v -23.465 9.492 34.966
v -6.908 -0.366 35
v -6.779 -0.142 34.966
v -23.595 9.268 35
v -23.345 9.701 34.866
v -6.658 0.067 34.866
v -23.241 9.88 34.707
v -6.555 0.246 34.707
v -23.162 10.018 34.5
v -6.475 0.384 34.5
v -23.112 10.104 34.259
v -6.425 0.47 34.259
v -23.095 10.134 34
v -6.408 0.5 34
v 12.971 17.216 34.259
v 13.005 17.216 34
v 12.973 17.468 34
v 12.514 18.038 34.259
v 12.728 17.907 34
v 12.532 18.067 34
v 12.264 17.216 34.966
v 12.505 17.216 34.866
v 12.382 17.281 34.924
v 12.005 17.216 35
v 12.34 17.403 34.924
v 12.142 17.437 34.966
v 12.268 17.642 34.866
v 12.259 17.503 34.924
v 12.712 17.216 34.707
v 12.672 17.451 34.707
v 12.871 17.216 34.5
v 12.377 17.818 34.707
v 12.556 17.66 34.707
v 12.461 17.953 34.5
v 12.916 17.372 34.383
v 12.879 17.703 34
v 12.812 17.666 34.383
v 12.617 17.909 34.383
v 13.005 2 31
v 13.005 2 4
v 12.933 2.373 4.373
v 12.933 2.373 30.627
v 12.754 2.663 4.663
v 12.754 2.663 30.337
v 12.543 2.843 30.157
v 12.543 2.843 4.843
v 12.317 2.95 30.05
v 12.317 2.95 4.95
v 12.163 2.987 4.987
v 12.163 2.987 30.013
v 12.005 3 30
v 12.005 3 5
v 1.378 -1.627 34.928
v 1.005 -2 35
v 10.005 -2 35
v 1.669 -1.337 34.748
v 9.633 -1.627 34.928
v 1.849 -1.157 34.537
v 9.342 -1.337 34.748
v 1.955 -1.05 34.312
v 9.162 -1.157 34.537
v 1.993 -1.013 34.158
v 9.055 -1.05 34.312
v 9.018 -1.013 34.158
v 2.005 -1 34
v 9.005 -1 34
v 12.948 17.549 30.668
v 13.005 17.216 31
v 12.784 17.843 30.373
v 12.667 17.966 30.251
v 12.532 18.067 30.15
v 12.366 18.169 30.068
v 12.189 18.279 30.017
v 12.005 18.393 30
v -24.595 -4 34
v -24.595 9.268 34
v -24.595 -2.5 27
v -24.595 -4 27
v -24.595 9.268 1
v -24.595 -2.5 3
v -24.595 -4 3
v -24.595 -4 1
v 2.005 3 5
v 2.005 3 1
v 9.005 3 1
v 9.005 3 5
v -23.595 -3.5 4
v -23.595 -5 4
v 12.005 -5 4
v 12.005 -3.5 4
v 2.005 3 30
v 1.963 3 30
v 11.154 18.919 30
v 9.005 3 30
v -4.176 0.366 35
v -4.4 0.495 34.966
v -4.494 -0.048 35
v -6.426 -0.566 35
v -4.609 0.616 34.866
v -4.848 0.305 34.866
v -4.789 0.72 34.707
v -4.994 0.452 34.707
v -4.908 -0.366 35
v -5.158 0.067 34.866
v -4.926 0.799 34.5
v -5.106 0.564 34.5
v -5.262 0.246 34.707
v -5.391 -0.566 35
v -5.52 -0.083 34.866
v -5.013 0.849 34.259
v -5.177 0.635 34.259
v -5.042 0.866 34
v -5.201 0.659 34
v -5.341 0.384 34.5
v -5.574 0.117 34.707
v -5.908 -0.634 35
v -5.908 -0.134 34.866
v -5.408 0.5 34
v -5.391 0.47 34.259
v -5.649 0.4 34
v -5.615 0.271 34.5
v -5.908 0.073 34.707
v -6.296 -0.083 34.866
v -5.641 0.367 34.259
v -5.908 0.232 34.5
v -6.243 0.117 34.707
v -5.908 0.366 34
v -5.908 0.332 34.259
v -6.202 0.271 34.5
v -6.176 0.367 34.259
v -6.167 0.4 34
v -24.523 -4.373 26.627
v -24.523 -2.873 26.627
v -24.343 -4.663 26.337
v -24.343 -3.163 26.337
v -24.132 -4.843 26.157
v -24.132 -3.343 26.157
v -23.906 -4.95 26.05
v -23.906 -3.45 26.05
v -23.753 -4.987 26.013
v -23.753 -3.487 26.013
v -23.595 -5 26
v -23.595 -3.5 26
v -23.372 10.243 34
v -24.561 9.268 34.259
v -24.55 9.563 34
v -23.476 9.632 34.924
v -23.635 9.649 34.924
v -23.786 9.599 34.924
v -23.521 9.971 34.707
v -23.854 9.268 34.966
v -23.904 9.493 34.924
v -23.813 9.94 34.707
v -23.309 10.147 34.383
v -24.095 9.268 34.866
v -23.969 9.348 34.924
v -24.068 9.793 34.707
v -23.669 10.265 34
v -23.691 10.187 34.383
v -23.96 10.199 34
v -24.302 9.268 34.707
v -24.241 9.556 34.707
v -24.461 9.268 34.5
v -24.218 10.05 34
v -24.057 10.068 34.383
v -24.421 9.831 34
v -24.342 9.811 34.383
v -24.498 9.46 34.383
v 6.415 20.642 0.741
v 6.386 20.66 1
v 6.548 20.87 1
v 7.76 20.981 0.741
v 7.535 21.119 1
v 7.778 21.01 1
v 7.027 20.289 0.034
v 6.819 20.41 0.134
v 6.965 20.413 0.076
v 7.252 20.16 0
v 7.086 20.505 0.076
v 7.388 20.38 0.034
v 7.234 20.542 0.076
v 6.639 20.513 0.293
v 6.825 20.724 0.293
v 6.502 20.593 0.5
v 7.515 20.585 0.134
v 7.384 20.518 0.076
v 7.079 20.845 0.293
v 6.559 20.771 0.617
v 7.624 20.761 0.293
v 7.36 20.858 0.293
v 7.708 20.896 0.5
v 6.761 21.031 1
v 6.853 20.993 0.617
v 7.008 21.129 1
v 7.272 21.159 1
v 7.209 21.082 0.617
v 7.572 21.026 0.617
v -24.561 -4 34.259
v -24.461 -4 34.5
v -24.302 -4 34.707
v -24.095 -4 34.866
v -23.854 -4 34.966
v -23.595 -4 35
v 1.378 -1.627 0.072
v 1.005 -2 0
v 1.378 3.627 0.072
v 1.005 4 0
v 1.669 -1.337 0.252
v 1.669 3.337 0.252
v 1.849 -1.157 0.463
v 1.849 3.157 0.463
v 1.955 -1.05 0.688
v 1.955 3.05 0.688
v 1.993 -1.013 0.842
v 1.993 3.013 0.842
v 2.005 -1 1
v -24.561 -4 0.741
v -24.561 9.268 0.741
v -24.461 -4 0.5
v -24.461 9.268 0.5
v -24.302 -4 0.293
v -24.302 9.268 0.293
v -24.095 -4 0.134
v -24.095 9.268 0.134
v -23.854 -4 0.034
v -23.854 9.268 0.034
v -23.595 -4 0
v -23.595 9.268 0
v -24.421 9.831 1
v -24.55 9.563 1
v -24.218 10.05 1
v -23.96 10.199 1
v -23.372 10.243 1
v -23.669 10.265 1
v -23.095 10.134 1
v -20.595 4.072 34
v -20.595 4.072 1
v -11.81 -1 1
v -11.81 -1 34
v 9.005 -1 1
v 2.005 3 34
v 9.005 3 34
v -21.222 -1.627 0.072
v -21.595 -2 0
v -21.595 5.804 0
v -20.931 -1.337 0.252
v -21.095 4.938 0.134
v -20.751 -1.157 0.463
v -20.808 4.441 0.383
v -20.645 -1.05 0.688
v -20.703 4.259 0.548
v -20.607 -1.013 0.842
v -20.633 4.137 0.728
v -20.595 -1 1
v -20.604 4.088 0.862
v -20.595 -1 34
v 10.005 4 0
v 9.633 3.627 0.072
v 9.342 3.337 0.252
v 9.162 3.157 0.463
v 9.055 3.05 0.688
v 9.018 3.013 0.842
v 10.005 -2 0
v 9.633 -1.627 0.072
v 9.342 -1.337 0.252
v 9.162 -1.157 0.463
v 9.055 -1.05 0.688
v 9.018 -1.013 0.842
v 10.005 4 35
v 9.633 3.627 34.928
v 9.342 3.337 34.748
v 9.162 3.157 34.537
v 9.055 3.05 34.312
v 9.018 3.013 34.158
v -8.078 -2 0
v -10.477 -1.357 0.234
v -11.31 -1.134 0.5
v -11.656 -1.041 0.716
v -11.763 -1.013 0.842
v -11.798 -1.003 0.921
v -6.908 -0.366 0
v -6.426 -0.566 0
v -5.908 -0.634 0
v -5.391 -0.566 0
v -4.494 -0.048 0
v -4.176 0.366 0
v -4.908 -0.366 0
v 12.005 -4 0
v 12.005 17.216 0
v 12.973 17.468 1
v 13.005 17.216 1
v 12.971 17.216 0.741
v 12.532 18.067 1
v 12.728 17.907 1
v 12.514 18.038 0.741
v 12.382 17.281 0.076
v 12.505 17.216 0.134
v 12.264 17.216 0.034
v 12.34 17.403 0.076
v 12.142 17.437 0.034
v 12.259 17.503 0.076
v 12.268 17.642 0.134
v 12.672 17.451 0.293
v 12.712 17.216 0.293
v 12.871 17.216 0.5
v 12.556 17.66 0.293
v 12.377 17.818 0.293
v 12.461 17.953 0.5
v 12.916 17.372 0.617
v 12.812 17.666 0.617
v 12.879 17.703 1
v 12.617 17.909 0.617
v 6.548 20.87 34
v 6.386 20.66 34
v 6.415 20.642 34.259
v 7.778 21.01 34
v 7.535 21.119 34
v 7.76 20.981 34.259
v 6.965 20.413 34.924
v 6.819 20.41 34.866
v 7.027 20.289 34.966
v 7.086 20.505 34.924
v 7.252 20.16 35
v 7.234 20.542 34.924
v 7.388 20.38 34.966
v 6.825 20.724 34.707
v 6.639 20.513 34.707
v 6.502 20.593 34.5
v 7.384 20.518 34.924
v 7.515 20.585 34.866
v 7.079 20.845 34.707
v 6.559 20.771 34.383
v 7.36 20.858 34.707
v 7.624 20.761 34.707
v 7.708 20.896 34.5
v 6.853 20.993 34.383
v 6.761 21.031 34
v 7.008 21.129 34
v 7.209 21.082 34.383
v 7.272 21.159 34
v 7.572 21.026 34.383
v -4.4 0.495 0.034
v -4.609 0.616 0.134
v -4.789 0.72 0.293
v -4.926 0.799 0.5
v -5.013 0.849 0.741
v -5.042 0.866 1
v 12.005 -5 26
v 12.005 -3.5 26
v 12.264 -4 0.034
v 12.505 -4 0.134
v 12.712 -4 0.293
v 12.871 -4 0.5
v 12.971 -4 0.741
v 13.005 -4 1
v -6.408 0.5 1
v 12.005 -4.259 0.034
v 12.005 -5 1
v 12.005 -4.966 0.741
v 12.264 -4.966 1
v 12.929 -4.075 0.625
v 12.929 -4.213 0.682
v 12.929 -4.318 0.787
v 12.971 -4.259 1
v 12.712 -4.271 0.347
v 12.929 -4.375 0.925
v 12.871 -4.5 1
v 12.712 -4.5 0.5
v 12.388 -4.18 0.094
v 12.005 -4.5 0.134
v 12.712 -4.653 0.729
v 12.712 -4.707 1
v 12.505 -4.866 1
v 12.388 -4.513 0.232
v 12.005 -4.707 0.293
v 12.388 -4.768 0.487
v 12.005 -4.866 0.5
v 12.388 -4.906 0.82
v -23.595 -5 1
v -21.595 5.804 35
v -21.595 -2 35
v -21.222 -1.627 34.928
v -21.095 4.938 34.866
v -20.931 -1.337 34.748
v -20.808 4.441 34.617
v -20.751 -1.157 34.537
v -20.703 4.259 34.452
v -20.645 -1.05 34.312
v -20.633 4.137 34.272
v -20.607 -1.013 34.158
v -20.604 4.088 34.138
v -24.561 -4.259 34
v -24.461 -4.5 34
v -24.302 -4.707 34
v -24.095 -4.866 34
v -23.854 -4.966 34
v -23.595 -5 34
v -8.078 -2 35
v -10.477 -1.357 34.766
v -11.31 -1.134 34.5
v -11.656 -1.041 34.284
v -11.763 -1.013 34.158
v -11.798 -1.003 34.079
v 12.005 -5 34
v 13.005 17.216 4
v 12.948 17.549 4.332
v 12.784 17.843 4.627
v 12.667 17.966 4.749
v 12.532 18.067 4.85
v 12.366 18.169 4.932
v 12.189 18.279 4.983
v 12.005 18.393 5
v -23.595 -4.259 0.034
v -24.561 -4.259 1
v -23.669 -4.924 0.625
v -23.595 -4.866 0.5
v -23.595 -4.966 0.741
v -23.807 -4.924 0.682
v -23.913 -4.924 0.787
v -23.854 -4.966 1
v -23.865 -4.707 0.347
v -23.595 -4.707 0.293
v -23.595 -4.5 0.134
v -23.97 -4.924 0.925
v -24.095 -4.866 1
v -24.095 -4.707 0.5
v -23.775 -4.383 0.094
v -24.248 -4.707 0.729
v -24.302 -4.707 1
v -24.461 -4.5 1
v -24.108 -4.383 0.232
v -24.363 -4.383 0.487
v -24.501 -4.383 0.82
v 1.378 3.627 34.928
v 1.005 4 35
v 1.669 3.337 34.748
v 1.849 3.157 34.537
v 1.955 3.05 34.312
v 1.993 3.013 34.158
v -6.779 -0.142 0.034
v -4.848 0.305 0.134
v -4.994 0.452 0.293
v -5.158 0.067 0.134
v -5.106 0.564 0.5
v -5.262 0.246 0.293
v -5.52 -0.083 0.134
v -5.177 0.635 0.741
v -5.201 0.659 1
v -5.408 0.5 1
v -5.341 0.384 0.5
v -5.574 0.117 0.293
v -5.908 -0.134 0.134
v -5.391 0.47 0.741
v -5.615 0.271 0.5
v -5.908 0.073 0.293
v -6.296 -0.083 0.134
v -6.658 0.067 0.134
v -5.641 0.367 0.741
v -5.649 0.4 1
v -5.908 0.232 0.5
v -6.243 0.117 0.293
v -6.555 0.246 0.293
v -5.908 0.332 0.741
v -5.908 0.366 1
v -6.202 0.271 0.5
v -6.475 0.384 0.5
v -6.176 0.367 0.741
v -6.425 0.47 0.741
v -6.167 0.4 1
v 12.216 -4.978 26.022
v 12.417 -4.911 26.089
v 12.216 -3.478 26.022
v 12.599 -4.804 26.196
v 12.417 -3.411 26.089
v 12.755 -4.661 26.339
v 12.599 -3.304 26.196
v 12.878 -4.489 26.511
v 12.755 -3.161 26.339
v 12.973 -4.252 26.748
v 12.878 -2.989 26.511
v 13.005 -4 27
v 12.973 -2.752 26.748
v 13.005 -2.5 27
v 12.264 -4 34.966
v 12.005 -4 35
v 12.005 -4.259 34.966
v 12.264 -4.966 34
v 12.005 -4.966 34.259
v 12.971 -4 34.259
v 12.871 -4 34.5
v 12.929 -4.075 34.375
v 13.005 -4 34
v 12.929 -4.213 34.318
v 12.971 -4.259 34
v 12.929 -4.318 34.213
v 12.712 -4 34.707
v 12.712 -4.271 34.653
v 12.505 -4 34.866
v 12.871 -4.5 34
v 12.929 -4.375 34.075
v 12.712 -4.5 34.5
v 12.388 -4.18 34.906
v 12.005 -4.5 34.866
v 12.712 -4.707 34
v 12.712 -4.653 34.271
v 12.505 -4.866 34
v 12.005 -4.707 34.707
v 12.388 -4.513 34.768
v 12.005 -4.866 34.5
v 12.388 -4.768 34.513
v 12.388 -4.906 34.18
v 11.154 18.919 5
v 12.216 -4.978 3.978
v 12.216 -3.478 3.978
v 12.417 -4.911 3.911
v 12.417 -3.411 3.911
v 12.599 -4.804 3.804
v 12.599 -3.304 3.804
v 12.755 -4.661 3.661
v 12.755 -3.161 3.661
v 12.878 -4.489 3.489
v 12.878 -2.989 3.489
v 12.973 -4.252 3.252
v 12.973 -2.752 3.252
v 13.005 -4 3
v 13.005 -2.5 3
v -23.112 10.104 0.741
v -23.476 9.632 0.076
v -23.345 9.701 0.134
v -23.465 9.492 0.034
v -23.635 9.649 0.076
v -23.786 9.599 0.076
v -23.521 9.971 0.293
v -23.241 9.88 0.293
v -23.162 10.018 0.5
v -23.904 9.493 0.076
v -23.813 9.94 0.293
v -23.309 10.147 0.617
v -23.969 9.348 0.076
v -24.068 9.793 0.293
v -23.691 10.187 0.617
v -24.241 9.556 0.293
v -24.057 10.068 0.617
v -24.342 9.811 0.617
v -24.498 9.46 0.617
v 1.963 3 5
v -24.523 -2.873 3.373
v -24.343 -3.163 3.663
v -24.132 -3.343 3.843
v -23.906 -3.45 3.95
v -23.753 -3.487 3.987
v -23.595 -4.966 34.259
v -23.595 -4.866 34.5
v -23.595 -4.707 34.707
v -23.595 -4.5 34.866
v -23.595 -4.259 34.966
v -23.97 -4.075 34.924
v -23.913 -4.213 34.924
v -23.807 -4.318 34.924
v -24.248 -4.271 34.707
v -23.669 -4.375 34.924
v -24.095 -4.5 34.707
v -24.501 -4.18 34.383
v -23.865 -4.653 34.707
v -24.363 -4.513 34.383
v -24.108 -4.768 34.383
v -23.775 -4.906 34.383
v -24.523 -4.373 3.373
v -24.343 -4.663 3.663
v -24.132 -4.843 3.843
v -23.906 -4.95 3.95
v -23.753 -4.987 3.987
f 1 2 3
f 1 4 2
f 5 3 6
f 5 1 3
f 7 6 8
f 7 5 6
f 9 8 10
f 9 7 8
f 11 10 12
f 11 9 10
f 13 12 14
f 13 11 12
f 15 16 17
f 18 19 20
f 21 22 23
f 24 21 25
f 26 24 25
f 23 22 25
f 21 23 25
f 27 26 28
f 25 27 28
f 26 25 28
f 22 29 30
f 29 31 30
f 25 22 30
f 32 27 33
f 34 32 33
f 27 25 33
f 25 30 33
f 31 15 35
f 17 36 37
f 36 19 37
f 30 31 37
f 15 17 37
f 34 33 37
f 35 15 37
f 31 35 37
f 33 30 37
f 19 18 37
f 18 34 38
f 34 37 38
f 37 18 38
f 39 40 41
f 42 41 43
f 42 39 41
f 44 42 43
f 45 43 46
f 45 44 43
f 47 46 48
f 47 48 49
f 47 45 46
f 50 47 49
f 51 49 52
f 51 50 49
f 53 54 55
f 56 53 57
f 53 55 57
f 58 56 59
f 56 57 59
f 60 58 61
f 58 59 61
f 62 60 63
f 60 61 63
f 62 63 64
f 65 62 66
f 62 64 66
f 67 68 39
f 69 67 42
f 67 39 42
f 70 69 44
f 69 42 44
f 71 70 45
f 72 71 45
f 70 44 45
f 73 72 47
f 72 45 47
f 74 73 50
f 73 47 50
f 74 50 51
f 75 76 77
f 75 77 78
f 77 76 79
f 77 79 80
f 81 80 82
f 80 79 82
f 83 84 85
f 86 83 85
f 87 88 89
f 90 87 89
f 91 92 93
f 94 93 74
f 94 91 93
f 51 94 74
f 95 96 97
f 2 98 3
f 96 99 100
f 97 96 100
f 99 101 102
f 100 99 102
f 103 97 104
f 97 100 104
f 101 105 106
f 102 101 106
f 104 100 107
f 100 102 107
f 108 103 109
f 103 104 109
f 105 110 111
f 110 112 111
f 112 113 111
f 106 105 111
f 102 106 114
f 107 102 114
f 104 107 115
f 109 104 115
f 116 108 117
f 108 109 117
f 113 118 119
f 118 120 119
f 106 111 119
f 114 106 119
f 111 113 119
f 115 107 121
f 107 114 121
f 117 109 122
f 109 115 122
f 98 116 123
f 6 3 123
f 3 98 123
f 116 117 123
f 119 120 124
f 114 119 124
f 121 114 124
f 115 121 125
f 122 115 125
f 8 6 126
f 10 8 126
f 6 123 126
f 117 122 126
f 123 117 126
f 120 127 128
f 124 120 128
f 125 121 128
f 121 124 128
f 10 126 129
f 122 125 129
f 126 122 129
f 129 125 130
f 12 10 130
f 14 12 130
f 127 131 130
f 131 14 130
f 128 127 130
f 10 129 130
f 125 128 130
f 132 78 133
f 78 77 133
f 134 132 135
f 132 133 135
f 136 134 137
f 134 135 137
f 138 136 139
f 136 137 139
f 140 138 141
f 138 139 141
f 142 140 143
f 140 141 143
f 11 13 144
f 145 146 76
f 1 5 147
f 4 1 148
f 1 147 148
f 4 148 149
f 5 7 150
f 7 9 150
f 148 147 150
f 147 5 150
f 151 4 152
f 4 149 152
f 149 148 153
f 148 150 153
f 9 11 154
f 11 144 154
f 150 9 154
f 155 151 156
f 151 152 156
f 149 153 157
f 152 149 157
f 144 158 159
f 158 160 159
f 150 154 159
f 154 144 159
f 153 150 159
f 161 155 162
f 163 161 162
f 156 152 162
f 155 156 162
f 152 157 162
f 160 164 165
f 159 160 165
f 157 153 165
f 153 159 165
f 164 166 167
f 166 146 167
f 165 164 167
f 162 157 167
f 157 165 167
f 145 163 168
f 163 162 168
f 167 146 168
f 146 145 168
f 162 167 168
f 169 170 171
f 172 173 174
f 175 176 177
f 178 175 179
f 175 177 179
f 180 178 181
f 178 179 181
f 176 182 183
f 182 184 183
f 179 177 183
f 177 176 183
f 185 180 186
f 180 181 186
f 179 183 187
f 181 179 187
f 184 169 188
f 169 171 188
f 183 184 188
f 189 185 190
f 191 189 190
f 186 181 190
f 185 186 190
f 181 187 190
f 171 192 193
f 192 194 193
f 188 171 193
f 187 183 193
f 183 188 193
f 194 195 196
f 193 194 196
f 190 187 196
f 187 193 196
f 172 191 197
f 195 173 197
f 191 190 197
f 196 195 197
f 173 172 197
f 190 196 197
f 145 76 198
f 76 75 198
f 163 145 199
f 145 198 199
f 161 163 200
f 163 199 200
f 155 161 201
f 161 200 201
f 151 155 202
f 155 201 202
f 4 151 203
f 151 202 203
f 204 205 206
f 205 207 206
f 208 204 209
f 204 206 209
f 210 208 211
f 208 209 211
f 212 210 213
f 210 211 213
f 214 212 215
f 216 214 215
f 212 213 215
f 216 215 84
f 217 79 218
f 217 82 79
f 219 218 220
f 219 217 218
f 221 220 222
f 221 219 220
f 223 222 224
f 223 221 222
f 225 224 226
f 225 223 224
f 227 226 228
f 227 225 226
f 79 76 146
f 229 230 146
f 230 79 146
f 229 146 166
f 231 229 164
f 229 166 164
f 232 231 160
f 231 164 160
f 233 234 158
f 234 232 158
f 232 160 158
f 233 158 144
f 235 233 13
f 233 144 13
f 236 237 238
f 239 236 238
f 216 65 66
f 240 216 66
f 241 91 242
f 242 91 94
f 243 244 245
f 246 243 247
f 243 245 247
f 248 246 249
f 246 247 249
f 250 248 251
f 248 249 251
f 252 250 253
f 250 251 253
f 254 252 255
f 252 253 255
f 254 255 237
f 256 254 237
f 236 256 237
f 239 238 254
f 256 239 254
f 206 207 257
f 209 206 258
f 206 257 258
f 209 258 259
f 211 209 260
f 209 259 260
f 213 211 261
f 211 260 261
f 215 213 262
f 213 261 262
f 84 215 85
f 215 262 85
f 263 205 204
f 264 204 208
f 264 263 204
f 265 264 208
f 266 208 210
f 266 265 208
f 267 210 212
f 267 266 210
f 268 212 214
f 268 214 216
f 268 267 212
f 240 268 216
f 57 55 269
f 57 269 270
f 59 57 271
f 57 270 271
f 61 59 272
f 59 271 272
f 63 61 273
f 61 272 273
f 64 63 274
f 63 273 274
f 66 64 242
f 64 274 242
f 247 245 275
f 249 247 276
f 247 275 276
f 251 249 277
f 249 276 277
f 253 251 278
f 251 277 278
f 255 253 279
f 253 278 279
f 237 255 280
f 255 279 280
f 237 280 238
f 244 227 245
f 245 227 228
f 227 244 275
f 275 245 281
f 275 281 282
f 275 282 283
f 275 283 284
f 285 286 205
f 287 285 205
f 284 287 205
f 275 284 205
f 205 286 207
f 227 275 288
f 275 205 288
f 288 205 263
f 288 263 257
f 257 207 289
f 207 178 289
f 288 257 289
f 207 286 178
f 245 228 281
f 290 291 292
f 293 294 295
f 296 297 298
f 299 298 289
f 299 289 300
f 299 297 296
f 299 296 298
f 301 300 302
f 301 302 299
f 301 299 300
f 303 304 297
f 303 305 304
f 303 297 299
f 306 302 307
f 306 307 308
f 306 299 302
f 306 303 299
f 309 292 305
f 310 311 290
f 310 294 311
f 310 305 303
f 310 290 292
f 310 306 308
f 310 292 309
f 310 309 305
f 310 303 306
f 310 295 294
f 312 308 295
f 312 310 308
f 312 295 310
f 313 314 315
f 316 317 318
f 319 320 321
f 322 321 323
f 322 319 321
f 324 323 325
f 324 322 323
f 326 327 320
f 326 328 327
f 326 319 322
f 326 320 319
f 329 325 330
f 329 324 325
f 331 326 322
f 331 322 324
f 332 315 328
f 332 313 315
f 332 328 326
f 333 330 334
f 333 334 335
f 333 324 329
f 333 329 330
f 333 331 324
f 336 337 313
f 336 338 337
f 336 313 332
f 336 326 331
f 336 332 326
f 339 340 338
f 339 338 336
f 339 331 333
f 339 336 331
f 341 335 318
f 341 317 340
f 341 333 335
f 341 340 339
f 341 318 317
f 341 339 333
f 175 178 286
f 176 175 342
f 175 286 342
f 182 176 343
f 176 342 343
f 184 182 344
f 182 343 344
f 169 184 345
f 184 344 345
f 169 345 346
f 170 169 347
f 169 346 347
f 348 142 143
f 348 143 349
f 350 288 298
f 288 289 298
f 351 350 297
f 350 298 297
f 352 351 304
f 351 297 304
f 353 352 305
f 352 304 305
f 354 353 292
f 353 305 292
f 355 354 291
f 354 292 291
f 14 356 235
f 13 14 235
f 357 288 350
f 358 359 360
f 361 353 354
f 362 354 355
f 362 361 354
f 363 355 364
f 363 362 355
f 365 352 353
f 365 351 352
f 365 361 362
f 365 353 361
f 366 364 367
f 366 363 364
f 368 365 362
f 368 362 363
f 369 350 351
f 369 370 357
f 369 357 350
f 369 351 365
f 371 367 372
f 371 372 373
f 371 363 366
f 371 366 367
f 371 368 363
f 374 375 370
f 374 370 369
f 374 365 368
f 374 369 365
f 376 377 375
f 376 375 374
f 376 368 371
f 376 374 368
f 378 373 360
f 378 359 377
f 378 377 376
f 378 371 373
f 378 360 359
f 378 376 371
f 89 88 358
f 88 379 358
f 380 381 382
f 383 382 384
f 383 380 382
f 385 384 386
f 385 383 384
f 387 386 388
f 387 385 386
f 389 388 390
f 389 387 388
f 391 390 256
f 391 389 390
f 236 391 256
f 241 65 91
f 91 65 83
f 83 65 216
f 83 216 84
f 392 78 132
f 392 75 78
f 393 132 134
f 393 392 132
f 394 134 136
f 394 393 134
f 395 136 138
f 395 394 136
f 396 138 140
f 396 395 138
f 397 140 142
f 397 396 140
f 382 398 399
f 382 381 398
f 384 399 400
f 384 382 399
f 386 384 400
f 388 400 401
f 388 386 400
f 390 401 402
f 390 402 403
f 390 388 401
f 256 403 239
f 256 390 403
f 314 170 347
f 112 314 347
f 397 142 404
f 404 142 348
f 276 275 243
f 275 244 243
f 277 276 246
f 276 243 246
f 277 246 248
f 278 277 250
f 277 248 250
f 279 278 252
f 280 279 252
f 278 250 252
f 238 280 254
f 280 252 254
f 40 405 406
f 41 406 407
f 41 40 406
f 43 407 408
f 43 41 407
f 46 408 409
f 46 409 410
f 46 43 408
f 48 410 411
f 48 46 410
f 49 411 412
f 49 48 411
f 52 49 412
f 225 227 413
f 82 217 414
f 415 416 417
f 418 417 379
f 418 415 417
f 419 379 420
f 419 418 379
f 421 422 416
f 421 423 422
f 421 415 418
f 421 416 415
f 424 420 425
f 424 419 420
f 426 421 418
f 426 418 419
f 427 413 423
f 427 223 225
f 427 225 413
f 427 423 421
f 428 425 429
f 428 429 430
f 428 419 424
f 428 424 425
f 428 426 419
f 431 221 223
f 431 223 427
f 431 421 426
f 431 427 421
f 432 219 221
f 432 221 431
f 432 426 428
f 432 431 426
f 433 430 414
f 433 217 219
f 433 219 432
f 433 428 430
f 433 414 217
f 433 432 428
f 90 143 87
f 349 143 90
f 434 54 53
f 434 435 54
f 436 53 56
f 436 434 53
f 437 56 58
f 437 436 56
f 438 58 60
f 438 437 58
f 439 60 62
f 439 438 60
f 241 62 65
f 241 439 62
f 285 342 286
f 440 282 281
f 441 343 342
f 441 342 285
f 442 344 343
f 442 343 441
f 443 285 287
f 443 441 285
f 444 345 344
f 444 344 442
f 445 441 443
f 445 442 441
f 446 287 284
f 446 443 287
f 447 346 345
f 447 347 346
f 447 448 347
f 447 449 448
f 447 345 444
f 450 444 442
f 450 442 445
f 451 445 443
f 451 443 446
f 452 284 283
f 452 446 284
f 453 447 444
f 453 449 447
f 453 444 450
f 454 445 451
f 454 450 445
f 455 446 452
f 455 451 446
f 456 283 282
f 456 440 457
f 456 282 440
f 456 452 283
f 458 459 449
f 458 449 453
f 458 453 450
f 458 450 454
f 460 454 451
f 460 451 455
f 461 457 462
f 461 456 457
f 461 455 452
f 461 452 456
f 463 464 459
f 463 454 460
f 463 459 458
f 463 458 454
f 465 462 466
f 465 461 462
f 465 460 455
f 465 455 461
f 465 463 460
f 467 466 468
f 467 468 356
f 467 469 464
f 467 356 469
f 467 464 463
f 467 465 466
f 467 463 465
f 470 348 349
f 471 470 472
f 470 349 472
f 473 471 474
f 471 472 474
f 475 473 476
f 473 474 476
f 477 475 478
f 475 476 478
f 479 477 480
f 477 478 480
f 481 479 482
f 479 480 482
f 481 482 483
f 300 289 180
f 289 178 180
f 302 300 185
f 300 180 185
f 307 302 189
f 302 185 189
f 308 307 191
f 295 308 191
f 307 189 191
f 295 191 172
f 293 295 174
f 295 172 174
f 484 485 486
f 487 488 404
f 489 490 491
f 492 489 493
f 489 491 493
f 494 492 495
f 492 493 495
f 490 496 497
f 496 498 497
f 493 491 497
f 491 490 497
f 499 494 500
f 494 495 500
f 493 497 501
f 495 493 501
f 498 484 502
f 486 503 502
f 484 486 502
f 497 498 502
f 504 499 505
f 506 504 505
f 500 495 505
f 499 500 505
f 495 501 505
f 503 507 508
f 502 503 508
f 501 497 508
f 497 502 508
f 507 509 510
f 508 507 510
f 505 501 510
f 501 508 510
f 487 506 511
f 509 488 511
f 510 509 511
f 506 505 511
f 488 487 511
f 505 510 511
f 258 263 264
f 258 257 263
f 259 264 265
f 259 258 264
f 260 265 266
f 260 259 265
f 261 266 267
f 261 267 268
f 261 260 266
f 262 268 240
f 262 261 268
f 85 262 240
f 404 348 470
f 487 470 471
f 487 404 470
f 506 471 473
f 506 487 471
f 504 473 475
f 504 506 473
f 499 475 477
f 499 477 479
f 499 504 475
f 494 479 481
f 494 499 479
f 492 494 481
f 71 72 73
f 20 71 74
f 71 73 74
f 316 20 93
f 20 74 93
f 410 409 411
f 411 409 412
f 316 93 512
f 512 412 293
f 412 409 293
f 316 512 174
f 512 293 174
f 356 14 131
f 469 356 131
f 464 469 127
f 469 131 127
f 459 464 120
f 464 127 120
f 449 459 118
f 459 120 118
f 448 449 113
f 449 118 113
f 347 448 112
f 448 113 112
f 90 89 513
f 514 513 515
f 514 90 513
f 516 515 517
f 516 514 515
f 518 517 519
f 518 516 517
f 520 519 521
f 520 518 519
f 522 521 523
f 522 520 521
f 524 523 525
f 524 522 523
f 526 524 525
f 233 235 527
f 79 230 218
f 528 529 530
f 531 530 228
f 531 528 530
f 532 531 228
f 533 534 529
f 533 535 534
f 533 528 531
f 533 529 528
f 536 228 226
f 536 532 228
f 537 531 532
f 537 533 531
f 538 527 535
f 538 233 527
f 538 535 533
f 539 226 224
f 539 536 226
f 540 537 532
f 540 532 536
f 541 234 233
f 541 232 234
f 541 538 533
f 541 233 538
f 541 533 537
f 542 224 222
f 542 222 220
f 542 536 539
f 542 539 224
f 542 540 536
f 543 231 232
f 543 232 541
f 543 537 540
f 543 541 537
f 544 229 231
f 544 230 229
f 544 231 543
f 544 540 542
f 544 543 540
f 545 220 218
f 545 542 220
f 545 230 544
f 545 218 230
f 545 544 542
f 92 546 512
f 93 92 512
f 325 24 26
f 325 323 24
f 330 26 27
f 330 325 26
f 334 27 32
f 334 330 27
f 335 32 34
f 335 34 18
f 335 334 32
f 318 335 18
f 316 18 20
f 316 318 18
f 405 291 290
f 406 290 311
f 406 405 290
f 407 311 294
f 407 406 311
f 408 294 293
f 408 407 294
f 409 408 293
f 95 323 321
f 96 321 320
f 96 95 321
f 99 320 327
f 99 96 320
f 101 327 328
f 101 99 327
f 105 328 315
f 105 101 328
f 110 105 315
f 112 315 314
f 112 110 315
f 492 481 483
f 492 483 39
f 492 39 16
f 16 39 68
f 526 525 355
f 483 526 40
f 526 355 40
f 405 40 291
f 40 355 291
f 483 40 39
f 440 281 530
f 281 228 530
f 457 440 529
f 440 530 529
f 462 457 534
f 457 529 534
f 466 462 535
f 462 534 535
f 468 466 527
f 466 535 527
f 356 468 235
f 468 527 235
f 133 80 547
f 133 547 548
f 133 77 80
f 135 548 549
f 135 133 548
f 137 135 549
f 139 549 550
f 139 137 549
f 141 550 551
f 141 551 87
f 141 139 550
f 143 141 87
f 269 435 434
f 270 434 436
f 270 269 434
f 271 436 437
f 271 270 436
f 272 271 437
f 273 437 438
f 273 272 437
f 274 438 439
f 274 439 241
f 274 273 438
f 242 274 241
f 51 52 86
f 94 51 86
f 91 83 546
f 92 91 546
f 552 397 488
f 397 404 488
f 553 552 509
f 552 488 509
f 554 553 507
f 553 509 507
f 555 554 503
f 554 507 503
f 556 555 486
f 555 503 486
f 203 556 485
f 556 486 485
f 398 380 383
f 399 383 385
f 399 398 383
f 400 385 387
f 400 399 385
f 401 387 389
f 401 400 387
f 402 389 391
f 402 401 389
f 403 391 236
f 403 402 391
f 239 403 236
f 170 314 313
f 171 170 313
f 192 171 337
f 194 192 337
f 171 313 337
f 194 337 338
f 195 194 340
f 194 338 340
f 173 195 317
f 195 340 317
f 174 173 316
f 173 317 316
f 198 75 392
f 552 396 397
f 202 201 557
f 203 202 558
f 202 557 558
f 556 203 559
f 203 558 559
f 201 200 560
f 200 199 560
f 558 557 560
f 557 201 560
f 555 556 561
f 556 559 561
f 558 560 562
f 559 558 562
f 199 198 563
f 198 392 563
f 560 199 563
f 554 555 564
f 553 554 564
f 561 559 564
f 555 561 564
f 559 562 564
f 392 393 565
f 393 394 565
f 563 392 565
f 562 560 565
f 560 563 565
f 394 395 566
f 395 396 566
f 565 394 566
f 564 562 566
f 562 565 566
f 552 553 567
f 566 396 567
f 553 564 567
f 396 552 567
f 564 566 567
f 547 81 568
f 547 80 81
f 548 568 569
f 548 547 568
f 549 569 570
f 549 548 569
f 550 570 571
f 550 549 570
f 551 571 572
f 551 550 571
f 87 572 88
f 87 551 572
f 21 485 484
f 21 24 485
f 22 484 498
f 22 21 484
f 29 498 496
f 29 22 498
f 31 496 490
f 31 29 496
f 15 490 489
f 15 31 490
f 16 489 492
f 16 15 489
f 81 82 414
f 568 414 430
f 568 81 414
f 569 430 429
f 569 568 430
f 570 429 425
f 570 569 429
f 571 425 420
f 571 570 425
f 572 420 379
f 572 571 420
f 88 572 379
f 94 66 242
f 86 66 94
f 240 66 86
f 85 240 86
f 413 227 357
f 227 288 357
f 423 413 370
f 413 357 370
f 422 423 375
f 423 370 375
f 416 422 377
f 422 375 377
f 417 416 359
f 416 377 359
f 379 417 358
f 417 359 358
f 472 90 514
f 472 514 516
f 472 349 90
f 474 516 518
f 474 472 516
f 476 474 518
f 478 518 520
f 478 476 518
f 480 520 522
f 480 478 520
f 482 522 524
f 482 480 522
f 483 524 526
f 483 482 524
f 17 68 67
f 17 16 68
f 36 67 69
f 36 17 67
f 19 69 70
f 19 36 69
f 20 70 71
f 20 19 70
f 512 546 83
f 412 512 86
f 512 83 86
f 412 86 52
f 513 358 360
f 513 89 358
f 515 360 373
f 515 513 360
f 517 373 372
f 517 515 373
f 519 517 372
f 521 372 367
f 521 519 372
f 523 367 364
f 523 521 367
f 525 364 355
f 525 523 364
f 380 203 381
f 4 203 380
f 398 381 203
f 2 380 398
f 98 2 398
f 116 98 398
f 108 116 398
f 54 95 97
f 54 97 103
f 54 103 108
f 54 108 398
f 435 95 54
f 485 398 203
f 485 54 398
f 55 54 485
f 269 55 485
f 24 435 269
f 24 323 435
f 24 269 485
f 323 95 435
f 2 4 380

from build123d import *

# Parameters (mm, degrees)
F0_W     = 7
F0_H     = 4
F1_DEPTH = 35
F5_DEPTH = 25
F2_W     = 37.6
F2_H     = 22
F6_DEPTH = 1.5
F7_R     = 1


with BuildPart() as f1:
    # F0 (on Top) → F1 (new body)
    with BuildSketch(Plane.XY):
        Polygon((-24.5947403937, 11), (-24.5947403937, -5), (13.0052596063, -5), (13.0052596063, 17.7735), (6.9012222925, 21.5526076059), (-5.5421815105, 0), align=None)
        Polygon((-20.5947403937, -1), (-20.5947403937, 4.0717967697), (-11.8101307029, -1), align=None, mode=Mode.SUBTRACT)
        with Locations((5.5052596063, 1)):
            Rectangle(F0_W, F0_H, mode=Mode.SUBTRACT)
    extrude(amount=F1_DEPTH)

    # F4 (on offset) → F5 (cut)
    with BuildSketch(Plane(origin=(0, 0, 5), x_dir=(1, 0, 0), z_dir=(0, 0, -1))):
        Polygon((13.0052596063, -22.1251103646), (13.0052596063, -3), (1.963371989, -3), align=None)
    extrude(amount=-F5_DEPTH, mode=Mode.SUBTRACT)

    # F2 (on face) → F6 (cut)
    with BuildSketch(Plane.XZ.offset(5)):
        with Locations((-5.7947403937, 15)):
            Rectangle(F2_W, F2_H)
    extrude(amount=-F6_DEPTH, mode=Mode.SUBTRACT)

    # F7
    f7_edges = [f1.edges().sort_by_distance(p)[0] for p in [
        (6.901222, 21.552608, 17.5),
        (-5.542182, 0, 17.5),
        (0.67952, 10.776304, 0),
        (0.67952, 10.776304, 35),
        (-24.59474, 11, 17.5),
        (-15.068461, 5.5, 0),
        (-15.068461, 5.5, 35),
        (-24.59474, 3, 0),
        (-5.79474, -5, 0),
        (13.00526, 6.38675, 0),
        (9.953241, 19.663054, 0),
        (-20.59474, 1.535898, 0),
        (-16.202436, 1.535898, 0),
        (-16.202436, -1, 0),
        (2.00526, 1, 0),
        (5.50526, 3, 0),
        (9.00526, 1, 0),
        (5.50526, -1, 0),
        (-24.59474, -5, 2),
        (-24.59474, -4.25, 4),
        (-24.59474, -3.5, 15),
        (-24.59474, -4.25, 26),
        (-24.59474, -5, 30.5),
        (-24.59474, 3, 35),
        (-5.79474, -5, 35),
        (13.00526, 6.38675, 35),
        (9.953241, 19.663054, 35),
        (-20.59474, 1.535898, 35),
        (-16.202436, 1.535898, 35),
        (-16.202436, -1, 35),
        (2.00526, 1, 35),
        (5.50526, 3, 35),
        (9.00526, 1, 35),
        (5.50526, -1, 35),
        (13.00526, 17.7735, 2.5),
        (13.00526, 10.38675, 5),
        (13.00526, 3, 17.5),
        (13.00526, 10.38675, 30),
        (13.00526, 17.7735, 32.5),
        (13.00526, -5, 30.5),
        (13.00526, -4.25, 26),
        (13.00526, -3.5, 15),
        (13.00526, -4.25, 4),
        (13.00526, -5, 2),
    ]]
    fillet(f7_edges, radius=F7_R)


solid = f1.part
